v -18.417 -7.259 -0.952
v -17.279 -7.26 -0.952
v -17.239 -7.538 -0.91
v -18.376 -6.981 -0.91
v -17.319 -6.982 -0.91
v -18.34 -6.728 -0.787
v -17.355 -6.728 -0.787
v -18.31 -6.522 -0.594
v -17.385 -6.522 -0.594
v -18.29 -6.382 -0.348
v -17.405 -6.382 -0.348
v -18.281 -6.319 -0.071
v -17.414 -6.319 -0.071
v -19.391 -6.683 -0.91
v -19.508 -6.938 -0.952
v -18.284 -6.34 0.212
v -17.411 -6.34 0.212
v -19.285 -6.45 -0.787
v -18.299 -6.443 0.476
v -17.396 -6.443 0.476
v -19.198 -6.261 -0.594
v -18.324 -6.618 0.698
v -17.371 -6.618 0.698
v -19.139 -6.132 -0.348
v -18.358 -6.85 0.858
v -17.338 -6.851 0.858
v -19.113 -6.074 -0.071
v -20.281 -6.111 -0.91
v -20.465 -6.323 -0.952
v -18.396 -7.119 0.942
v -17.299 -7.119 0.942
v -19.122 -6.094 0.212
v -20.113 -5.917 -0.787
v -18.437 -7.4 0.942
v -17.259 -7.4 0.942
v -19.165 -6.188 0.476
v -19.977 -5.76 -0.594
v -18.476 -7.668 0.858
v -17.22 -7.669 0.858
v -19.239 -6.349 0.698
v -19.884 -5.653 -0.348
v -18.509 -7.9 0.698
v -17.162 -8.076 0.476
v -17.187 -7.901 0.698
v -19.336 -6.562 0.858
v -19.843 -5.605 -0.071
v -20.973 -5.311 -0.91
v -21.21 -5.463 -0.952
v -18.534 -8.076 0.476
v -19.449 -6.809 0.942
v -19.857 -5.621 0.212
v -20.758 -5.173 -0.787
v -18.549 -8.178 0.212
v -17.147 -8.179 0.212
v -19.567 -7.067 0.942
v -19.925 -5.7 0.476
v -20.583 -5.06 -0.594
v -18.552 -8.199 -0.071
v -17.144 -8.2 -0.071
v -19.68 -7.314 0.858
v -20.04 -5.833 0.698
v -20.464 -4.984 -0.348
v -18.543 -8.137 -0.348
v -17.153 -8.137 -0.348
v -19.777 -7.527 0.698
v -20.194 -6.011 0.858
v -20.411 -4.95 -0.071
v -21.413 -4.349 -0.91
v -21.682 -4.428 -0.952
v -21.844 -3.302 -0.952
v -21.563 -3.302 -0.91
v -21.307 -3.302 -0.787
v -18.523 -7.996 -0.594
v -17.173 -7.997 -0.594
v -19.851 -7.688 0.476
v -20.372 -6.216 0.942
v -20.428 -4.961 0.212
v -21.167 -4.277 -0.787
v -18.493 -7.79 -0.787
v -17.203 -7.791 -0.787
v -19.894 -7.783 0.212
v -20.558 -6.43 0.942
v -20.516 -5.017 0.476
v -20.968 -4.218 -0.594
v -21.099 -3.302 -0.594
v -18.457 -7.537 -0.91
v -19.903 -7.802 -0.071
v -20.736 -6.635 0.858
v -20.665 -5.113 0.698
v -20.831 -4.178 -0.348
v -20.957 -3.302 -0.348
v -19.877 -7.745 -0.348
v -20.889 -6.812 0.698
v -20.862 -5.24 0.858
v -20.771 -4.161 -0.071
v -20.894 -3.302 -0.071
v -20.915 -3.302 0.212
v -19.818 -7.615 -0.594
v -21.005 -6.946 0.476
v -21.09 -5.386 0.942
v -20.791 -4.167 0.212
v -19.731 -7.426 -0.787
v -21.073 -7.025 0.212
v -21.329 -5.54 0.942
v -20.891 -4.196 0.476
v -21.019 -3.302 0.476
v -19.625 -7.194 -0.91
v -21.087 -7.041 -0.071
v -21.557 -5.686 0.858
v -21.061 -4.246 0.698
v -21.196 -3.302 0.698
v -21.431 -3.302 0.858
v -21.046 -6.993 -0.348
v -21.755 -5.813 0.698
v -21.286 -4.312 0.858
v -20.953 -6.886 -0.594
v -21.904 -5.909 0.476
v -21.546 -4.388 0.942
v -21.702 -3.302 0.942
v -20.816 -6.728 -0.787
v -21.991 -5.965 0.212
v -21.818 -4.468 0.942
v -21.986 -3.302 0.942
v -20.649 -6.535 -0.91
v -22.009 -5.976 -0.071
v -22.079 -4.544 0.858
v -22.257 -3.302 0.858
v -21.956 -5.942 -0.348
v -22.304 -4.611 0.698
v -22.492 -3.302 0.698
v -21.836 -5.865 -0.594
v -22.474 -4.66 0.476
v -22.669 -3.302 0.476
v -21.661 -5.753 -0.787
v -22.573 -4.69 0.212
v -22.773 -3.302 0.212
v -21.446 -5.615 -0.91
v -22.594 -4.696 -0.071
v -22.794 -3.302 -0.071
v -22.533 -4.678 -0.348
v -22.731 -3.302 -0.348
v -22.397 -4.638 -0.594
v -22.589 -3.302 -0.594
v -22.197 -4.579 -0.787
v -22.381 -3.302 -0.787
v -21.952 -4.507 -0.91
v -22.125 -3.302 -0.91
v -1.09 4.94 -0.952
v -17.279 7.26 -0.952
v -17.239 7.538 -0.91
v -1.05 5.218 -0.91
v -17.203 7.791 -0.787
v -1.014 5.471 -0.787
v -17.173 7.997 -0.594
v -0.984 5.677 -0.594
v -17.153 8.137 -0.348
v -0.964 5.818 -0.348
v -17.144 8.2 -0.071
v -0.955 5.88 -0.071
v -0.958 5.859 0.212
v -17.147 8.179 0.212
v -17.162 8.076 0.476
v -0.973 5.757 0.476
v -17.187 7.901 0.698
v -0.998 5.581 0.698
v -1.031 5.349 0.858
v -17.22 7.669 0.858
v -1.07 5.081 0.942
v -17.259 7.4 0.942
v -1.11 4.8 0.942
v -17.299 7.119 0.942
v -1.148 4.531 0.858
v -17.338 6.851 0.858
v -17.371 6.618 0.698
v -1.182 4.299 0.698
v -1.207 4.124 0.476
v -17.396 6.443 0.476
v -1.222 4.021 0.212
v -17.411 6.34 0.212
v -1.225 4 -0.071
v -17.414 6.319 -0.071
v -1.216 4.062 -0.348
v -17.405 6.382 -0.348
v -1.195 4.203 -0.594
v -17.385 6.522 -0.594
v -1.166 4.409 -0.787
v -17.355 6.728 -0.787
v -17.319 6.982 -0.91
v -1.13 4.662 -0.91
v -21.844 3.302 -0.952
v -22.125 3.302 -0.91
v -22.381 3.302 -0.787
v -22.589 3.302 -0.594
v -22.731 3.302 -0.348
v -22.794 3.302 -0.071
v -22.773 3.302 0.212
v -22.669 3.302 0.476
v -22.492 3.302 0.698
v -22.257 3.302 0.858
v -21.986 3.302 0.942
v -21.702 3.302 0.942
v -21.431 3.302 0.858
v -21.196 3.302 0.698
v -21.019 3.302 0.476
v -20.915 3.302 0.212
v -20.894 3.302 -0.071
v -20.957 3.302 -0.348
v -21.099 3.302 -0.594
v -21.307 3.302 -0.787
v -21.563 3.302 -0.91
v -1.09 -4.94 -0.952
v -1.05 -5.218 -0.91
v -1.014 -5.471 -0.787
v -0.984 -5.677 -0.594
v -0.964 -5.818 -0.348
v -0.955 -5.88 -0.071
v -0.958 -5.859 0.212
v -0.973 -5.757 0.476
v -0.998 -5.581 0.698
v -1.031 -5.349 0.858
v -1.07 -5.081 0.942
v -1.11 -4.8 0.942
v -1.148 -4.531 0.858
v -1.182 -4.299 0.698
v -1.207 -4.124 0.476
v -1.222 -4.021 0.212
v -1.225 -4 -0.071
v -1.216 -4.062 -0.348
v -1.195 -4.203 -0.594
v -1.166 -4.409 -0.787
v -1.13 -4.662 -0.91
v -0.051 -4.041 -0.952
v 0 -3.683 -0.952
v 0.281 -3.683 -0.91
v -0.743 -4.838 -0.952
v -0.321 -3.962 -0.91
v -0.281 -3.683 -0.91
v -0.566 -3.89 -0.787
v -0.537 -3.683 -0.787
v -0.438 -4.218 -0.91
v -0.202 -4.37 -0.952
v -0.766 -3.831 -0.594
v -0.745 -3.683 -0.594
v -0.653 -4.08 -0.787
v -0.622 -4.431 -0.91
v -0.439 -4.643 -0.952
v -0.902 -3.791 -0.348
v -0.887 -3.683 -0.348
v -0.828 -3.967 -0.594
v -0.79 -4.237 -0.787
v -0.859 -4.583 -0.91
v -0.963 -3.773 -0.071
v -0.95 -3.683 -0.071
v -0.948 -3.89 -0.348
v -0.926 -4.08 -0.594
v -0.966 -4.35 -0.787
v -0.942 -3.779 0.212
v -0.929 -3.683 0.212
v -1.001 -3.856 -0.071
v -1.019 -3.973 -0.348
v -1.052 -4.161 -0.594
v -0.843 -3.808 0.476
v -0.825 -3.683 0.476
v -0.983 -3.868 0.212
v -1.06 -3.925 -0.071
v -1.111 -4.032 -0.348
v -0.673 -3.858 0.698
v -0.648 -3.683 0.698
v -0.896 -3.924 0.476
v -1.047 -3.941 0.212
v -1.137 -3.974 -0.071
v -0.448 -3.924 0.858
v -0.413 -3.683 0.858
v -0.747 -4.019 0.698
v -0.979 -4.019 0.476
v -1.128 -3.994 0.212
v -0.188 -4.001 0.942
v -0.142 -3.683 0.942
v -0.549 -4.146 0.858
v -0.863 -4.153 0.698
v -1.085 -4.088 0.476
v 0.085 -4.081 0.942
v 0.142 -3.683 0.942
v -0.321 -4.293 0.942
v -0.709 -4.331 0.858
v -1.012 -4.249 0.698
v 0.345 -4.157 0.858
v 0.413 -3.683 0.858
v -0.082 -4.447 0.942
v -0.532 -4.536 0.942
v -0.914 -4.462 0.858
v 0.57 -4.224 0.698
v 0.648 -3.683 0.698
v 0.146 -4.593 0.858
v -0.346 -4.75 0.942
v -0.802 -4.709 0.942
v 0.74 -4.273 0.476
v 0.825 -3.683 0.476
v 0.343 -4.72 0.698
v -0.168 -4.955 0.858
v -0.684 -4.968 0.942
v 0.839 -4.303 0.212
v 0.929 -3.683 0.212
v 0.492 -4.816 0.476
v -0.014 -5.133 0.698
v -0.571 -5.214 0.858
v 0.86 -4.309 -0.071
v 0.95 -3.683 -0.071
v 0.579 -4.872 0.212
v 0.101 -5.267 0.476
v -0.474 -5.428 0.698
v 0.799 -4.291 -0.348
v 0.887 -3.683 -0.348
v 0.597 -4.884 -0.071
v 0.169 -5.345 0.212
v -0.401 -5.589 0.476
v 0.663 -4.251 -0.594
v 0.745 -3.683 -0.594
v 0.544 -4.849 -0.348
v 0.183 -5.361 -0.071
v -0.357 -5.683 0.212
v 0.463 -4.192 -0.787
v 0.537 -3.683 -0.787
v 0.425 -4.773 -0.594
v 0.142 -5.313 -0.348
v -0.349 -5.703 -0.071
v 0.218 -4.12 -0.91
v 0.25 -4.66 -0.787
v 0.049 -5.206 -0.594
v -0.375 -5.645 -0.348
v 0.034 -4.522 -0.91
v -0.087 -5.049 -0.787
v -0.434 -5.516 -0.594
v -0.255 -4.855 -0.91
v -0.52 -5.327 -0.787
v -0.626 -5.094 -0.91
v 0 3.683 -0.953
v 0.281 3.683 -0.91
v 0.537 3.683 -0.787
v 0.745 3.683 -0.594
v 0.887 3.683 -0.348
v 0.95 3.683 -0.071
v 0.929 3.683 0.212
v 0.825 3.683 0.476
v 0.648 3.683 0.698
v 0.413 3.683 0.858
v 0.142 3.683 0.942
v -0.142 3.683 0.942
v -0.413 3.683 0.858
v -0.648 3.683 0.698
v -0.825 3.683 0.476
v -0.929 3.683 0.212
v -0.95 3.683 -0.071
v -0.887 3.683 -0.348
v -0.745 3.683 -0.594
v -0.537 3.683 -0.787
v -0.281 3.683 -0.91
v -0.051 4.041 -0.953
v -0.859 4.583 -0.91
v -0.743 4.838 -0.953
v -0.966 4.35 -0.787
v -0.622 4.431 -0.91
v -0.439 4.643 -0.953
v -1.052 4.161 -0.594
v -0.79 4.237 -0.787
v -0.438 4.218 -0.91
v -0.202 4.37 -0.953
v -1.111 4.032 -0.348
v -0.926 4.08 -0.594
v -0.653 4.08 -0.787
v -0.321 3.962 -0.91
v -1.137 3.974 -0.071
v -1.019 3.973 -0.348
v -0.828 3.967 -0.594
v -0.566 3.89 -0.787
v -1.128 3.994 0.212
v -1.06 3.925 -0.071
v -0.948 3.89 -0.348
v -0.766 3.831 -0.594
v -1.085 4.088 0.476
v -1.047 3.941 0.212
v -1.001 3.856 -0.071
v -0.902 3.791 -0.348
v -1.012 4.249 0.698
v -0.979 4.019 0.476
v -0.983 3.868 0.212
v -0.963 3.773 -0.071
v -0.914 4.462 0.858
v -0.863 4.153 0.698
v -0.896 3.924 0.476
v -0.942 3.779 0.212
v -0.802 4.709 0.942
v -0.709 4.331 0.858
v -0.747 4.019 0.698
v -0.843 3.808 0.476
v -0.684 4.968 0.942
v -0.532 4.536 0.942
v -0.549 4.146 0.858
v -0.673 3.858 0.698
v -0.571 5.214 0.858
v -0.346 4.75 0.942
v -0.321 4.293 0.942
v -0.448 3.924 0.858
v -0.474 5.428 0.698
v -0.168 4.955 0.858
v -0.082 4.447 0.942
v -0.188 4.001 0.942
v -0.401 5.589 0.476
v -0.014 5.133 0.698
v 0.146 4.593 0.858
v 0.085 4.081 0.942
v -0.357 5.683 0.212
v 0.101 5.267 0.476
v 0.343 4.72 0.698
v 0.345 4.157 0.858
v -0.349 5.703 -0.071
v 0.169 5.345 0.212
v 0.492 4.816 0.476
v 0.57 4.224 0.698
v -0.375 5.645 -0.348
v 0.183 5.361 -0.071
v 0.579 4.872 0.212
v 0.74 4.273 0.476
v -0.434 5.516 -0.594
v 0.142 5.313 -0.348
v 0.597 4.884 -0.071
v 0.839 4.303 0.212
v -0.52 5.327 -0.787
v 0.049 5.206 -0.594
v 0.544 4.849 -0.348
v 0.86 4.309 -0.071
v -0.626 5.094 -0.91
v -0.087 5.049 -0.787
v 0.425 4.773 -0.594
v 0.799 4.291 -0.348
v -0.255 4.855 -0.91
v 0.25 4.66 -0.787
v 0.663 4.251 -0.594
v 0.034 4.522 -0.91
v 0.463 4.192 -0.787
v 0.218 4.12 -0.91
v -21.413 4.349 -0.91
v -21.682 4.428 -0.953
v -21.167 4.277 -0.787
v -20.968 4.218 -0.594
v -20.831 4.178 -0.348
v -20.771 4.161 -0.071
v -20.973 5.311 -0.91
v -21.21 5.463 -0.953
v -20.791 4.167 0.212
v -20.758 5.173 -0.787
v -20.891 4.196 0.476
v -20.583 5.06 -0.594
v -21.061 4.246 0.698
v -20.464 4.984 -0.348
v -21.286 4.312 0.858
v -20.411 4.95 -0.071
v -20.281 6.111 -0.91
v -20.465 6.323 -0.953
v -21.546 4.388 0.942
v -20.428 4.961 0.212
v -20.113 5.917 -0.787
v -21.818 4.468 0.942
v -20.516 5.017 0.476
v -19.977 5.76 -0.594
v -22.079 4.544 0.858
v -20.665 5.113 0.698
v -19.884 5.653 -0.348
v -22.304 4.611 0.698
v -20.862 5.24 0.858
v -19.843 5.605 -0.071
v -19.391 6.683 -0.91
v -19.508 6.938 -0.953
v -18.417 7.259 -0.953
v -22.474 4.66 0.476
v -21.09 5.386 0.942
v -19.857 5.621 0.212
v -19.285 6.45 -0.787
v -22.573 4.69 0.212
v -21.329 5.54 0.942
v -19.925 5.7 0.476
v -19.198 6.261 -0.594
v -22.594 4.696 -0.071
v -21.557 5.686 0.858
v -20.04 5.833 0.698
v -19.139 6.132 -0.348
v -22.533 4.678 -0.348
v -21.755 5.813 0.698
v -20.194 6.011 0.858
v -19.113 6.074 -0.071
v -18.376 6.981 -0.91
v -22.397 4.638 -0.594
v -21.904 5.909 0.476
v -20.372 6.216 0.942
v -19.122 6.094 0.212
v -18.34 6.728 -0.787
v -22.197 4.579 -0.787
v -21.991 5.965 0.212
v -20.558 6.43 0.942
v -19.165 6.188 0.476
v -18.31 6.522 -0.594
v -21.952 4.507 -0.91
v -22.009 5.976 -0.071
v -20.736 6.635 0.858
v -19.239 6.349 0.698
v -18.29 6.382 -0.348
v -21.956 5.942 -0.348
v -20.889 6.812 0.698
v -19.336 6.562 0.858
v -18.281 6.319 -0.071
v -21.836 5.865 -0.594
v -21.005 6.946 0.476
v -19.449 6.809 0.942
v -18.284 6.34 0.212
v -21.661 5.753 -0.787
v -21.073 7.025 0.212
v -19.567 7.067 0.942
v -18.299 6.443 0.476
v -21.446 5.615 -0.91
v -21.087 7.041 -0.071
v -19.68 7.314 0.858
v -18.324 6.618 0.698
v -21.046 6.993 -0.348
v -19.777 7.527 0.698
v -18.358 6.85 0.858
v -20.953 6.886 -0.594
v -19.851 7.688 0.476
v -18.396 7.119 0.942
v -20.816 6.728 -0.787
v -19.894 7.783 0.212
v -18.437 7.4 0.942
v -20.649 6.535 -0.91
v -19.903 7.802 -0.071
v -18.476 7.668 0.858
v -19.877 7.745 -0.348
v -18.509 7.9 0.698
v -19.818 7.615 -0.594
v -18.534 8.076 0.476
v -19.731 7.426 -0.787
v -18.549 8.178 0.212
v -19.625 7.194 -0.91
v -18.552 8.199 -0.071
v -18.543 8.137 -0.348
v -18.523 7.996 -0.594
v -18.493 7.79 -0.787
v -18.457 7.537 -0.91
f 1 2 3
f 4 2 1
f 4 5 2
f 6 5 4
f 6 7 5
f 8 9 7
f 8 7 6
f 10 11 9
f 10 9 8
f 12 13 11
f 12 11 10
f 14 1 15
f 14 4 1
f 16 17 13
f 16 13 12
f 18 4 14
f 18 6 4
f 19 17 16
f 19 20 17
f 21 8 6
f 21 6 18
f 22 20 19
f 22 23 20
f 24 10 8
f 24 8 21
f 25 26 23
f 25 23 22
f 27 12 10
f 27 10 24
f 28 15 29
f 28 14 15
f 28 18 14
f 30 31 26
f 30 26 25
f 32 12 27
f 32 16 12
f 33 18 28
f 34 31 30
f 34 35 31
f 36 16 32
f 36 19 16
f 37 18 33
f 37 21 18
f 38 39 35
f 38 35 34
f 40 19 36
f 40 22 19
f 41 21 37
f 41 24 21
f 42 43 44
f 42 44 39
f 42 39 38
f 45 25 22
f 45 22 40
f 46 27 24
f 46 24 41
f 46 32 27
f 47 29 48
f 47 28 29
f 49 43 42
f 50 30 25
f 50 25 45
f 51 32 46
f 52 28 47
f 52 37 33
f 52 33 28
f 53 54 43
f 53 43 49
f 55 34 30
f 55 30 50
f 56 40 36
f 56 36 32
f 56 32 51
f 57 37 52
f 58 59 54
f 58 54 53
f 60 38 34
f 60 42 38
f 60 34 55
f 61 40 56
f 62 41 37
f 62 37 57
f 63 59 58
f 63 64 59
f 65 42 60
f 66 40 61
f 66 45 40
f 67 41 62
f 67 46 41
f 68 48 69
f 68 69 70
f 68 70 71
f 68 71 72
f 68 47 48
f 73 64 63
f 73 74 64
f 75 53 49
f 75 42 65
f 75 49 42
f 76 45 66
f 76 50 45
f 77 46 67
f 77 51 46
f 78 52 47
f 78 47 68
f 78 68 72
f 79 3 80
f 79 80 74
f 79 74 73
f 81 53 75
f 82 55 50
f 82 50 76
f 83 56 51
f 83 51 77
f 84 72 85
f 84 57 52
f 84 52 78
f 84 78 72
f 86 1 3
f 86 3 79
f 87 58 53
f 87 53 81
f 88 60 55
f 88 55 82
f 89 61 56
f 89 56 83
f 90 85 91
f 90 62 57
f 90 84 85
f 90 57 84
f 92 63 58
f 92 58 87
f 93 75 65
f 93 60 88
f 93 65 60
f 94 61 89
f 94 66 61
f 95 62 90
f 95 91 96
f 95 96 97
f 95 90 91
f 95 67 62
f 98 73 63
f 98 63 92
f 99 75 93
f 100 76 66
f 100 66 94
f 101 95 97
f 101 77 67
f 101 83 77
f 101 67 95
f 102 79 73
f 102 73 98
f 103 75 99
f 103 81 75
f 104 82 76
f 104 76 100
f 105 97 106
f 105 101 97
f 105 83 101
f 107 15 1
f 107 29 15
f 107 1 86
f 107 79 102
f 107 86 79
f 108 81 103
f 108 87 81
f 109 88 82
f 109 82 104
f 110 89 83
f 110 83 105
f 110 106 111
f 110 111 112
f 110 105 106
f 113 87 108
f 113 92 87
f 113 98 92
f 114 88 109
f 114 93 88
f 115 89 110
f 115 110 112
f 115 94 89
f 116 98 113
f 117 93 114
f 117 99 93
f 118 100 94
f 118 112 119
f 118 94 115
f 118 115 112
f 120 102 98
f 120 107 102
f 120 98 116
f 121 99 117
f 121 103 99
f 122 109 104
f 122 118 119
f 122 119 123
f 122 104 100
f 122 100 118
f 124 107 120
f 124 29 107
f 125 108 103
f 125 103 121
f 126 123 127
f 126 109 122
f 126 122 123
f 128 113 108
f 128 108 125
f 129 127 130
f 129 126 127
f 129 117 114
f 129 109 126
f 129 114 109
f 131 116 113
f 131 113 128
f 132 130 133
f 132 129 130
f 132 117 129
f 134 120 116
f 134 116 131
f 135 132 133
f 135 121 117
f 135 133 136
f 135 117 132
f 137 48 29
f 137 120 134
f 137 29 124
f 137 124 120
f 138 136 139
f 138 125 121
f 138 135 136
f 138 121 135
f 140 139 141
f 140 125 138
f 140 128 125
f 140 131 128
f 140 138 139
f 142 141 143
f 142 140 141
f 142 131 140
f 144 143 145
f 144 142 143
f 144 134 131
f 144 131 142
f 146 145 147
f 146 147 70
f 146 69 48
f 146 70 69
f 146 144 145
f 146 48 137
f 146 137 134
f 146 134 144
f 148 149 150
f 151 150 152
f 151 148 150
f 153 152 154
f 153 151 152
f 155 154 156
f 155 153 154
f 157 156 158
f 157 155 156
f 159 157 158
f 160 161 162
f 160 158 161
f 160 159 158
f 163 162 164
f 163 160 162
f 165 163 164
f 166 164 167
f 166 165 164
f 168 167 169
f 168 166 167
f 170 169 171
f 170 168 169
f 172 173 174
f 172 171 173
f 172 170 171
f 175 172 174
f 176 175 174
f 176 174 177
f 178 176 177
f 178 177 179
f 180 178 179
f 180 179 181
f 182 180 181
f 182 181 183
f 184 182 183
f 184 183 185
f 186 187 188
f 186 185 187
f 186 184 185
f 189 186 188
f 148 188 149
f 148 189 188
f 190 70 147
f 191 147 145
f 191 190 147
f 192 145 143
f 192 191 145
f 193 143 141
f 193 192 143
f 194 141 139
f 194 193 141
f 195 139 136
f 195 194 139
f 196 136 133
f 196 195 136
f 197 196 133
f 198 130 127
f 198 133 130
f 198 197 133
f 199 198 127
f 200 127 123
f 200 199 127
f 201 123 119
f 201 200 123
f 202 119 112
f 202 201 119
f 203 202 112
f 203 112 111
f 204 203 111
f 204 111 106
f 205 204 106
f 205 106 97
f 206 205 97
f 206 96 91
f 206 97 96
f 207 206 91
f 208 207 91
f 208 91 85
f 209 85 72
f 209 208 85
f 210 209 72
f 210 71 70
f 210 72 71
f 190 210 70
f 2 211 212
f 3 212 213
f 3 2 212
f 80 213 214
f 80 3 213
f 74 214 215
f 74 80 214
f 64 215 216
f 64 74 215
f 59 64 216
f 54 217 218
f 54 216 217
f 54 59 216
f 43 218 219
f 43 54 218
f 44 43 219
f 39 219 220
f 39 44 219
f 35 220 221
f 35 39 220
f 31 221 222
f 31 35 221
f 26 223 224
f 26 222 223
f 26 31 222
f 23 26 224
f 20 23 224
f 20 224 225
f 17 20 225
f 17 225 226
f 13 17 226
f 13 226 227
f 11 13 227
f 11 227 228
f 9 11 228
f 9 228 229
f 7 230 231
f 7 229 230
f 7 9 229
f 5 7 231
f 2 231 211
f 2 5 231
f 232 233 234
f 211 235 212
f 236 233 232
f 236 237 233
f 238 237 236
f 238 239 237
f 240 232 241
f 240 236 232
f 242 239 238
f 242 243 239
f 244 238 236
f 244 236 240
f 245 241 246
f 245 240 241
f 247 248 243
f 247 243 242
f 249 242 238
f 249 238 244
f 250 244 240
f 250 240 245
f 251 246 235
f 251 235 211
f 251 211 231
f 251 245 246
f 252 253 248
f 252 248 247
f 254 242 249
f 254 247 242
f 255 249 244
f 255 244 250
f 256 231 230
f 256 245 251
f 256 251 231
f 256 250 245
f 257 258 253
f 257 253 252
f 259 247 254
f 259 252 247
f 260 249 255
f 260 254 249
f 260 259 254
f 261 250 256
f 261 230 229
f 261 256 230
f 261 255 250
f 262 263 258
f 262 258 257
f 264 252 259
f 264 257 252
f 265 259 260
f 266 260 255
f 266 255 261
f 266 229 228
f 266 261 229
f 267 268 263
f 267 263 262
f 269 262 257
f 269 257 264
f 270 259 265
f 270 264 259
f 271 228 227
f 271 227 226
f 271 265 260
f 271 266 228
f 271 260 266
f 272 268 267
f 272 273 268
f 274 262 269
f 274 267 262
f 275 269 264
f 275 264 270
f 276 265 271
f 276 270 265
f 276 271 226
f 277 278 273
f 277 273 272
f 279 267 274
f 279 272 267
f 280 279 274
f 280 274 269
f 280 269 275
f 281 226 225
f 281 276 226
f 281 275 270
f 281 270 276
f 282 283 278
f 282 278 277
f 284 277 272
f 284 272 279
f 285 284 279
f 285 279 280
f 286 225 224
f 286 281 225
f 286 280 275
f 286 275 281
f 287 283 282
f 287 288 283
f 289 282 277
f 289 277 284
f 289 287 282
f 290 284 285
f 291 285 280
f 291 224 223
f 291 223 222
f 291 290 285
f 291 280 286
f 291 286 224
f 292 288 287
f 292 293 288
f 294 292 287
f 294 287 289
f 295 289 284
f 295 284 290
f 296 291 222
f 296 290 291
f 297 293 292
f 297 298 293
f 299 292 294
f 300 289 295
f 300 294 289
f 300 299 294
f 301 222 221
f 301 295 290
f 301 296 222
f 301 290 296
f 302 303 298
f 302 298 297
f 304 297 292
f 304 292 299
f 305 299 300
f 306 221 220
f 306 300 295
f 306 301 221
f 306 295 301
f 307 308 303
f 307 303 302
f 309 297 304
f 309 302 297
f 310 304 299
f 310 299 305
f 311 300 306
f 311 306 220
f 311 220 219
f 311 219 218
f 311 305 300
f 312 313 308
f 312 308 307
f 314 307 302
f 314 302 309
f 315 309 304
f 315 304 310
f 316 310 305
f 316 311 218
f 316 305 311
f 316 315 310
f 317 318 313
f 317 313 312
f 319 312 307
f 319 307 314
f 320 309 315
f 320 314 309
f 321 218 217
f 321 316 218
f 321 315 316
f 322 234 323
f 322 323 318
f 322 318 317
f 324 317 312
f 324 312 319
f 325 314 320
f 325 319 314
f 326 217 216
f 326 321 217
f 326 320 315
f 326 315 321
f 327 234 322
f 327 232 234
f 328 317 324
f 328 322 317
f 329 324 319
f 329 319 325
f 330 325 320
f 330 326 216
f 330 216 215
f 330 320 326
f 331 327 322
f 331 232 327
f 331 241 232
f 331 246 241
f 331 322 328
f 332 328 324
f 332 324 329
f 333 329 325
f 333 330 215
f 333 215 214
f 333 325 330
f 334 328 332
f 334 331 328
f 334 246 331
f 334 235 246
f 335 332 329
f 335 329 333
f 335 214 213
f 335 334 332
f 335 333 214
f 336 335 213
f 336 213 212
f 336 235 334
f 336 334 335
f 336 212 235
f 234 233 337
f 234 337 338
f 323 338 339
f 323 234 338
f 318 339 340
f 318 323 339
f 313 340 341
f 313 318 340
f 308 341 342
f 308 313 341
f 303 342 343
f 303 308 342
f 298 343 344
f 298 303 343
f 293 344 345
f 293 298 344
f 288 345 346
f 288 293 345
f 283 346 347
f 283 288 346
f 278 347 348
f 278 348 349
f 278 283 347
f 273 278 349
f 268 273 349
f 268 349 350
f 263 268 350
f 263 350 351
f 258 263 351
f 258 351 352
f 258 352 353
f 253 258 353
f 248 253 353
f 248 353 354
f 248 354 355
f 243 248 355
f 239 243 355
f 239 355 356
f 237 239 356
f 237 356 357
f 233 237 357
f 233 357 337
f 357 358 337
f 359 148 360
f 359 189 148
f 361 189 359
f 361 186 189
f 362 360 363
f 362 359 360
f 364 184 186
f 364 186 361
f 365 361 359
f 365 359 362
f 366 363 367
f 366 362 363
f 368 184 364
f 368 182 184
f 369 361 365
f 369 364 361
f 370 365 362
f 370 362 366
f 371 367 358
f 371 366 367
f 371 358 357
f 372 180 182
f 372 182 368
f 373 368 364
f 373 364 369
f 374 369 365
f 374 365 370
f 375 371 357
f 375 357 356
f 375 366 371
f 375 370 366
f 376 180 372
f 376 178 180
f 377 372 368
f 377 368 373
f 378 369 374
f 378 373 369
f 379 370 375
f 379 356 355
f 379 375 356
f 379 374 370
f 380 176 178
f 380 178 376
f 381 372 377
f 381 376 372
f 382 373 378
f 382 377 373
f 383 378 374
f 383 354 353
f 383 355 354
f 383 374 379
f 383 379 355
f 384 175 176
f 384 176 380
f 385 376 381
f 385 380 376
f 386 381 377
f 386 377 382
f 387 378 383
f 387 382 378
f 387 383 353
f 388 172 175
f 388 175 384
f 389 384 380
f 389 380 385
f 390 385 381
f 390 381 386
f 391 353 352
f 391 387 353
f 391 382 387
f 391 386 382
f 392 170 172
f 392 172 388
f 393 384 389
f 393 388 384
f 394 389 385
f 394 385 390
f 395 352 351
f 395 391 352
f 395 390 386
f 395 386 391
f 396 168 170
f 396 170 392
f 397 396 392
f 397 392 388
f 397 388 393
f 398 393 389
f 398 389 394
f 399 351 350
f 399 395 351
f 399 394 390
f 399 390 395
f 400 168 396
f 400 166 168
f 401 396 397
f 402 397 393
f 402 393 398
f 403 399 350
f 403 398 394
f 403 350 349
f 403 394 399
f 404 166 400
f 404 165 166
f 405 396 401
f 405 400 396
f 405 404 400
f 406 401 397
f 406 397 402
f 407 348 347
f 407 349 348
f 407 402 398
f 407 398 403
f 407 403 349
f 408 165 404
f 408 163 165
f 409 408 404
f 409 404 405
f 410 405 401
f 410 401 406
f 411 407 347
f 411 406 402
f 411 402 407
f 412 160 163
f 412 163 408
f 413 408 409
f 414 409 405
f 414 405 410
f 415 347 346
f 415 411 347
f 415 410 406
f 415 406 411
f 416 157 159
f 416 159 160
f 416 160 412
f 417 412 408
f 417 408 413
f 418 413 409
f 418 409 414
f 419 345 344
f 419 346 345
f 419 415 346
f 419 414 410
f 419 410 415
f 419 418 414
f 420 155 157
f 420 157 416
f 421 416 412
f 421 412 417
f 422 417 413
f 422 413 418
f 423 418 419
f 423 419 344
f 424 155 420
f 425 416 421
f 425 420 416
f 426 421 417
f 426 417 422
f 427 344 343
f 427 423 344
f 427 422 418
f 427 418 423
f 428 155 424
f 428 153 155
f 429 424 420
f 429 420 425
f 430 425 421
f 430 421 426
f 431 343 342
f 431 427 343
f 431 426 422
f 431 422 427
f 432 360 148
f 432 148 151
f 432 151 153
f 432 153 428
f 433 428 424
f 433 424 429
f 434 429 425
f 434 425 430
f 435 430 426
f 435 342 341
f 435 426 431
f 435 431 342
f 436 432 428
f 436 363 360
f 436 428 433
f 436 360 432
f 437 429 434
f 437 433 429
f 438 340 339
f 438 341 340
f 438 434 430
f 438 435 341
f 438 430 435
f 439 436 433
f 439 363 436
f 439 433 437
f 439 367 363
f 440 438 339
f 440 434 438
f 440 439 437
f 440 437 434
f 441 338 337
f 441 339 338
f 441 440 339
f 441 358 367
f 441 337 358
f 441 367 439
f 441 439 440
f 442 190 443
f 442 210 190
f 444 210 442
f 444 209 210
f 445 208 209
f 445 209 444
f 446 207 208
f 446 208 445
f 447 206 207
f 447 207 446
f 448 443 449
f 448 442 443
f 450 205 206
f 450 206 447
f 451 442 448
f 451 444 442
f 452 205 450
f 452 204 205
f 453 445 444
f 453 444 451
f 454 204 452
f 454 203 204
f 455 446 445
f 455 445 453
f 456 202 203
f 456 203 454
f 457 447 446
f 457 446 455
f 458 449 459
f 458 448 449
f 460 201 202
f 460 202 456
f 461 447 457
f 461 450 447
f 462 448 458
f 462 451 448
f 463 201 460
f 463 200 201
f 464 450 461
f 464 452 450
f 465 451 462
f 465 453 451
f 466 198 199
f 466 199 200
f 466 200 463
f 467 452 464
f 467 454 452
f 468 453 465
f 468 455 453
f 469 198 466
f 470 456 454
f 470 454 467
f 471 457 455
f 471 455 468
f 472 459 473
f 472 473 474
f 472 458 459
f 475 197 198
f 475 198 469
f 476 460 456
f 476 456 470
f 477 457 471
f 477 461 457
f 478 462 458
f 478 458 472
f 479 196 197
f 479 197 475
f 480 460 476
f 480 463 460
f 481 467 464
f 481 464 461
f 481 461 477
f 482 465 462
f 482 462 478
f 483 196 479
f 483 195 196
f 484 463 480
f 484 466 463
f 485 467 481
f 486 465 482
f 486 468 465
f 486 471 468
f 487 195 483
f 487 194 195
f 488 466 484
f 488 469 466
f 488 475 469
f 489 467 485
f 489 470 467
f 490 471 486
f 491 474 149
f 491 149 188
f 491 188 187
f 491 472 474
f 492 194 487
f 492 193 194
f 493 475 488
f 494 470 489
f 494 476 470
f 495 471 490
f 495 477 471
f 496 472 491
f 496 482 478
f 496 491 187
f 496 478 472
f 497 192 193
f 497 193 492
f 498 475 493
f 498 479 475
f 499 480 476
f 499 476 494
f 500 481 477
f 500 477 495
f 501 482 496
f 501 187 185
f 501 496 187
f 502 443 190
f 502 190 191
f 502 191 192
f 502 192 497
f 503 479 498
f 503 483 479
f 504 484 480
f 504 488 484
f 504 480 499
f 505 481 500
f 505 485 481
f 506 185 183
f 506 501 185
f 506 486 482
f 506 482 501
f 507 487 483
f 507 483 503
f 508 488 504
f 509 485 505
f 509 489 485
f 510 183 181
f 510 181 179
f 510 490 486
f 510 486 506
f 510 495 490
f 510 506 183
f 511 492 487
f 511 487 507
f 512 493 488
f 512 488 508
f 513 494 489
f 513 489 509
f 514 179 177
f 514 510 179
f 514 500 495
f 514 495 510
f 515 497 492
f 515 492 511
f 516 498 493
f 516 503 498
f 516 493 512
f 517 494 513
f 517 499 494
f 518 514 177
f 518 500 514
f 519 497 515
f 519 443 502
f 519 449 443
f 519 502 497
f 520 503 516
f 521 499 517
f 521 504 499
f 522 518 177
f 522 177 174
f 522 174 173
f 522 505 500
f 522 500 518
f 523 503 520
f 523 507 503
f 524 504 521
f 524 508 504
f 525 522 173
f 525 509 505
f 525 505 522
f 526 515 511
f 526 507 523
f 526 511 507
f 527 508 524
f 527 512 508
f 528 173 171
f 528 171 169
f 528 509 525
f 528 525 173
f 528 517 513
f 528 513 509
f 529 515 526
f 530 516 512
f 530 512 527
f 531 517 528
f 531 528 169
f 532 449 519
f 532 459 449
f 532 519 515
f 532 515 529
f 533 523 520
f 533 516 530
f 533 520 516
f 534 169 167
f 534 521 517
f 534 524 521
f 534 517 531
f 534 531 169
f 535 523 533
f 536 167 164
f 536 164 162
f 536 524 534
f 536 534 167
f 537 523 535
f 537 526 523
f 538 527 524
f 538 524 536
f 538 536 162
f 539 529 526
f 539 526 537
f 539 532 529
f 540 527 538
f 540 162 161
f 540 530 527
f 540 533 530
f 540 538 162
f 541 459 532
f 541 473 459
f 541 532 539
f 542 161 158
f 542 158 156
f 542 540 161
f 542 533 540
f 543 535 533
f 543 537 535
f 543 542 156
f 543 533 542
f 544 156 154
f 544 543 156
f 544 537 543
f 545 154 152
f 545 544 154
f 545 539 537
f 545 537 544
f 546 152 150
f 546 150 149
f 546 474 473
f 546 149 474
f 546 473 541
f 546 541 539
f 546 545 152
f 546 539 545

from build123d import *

# Parameters (mm, degrees)
SKETCH1_R = 0.9525


with BuildPart() as part:
    # Sweep1: sweep along a path in Sketch2
    with BuildLine(Plane.XY) as sweep1_path:
        Line((0, 3.683), (0, -3.683))
        ThreePointArc((0, -3.683), (-0.310403565, -4.514910261), (-1.089881388, -4.940162394))
        Line((-1.089881388, -4.940162394), (-17.278929773, -7.25963117))
        ThreePointArc((-17.278929773, -7.25963117), (-20.464864245, -6.322873659), (-21.844, -3.302))
        Line((-21.844, -3.302), (-21.844, 3.302))
        ThreePointArc((-21.844, 3.302), (-20.464864245, 6.322873659), (-17.278929773, 7.25963117))
        Line((-17.278929773, 7.25963117), (-1.089881388, 4.940162394))
        ThreePointArc((-1.089881388, 4.940162394), (-0.310403565, 4.514910261), (0, 3.683))
    # Sketch1 → Sweep1 (sweep)
    with BuildSketch(Plane(origin=(0, 0, 0), x_dir=(0, 0, -1), z_dir=(0, 1, 0))):
        Circle(SKETCH1_R)
    sweep(path=sweep1_path.line)


solid = part.part
